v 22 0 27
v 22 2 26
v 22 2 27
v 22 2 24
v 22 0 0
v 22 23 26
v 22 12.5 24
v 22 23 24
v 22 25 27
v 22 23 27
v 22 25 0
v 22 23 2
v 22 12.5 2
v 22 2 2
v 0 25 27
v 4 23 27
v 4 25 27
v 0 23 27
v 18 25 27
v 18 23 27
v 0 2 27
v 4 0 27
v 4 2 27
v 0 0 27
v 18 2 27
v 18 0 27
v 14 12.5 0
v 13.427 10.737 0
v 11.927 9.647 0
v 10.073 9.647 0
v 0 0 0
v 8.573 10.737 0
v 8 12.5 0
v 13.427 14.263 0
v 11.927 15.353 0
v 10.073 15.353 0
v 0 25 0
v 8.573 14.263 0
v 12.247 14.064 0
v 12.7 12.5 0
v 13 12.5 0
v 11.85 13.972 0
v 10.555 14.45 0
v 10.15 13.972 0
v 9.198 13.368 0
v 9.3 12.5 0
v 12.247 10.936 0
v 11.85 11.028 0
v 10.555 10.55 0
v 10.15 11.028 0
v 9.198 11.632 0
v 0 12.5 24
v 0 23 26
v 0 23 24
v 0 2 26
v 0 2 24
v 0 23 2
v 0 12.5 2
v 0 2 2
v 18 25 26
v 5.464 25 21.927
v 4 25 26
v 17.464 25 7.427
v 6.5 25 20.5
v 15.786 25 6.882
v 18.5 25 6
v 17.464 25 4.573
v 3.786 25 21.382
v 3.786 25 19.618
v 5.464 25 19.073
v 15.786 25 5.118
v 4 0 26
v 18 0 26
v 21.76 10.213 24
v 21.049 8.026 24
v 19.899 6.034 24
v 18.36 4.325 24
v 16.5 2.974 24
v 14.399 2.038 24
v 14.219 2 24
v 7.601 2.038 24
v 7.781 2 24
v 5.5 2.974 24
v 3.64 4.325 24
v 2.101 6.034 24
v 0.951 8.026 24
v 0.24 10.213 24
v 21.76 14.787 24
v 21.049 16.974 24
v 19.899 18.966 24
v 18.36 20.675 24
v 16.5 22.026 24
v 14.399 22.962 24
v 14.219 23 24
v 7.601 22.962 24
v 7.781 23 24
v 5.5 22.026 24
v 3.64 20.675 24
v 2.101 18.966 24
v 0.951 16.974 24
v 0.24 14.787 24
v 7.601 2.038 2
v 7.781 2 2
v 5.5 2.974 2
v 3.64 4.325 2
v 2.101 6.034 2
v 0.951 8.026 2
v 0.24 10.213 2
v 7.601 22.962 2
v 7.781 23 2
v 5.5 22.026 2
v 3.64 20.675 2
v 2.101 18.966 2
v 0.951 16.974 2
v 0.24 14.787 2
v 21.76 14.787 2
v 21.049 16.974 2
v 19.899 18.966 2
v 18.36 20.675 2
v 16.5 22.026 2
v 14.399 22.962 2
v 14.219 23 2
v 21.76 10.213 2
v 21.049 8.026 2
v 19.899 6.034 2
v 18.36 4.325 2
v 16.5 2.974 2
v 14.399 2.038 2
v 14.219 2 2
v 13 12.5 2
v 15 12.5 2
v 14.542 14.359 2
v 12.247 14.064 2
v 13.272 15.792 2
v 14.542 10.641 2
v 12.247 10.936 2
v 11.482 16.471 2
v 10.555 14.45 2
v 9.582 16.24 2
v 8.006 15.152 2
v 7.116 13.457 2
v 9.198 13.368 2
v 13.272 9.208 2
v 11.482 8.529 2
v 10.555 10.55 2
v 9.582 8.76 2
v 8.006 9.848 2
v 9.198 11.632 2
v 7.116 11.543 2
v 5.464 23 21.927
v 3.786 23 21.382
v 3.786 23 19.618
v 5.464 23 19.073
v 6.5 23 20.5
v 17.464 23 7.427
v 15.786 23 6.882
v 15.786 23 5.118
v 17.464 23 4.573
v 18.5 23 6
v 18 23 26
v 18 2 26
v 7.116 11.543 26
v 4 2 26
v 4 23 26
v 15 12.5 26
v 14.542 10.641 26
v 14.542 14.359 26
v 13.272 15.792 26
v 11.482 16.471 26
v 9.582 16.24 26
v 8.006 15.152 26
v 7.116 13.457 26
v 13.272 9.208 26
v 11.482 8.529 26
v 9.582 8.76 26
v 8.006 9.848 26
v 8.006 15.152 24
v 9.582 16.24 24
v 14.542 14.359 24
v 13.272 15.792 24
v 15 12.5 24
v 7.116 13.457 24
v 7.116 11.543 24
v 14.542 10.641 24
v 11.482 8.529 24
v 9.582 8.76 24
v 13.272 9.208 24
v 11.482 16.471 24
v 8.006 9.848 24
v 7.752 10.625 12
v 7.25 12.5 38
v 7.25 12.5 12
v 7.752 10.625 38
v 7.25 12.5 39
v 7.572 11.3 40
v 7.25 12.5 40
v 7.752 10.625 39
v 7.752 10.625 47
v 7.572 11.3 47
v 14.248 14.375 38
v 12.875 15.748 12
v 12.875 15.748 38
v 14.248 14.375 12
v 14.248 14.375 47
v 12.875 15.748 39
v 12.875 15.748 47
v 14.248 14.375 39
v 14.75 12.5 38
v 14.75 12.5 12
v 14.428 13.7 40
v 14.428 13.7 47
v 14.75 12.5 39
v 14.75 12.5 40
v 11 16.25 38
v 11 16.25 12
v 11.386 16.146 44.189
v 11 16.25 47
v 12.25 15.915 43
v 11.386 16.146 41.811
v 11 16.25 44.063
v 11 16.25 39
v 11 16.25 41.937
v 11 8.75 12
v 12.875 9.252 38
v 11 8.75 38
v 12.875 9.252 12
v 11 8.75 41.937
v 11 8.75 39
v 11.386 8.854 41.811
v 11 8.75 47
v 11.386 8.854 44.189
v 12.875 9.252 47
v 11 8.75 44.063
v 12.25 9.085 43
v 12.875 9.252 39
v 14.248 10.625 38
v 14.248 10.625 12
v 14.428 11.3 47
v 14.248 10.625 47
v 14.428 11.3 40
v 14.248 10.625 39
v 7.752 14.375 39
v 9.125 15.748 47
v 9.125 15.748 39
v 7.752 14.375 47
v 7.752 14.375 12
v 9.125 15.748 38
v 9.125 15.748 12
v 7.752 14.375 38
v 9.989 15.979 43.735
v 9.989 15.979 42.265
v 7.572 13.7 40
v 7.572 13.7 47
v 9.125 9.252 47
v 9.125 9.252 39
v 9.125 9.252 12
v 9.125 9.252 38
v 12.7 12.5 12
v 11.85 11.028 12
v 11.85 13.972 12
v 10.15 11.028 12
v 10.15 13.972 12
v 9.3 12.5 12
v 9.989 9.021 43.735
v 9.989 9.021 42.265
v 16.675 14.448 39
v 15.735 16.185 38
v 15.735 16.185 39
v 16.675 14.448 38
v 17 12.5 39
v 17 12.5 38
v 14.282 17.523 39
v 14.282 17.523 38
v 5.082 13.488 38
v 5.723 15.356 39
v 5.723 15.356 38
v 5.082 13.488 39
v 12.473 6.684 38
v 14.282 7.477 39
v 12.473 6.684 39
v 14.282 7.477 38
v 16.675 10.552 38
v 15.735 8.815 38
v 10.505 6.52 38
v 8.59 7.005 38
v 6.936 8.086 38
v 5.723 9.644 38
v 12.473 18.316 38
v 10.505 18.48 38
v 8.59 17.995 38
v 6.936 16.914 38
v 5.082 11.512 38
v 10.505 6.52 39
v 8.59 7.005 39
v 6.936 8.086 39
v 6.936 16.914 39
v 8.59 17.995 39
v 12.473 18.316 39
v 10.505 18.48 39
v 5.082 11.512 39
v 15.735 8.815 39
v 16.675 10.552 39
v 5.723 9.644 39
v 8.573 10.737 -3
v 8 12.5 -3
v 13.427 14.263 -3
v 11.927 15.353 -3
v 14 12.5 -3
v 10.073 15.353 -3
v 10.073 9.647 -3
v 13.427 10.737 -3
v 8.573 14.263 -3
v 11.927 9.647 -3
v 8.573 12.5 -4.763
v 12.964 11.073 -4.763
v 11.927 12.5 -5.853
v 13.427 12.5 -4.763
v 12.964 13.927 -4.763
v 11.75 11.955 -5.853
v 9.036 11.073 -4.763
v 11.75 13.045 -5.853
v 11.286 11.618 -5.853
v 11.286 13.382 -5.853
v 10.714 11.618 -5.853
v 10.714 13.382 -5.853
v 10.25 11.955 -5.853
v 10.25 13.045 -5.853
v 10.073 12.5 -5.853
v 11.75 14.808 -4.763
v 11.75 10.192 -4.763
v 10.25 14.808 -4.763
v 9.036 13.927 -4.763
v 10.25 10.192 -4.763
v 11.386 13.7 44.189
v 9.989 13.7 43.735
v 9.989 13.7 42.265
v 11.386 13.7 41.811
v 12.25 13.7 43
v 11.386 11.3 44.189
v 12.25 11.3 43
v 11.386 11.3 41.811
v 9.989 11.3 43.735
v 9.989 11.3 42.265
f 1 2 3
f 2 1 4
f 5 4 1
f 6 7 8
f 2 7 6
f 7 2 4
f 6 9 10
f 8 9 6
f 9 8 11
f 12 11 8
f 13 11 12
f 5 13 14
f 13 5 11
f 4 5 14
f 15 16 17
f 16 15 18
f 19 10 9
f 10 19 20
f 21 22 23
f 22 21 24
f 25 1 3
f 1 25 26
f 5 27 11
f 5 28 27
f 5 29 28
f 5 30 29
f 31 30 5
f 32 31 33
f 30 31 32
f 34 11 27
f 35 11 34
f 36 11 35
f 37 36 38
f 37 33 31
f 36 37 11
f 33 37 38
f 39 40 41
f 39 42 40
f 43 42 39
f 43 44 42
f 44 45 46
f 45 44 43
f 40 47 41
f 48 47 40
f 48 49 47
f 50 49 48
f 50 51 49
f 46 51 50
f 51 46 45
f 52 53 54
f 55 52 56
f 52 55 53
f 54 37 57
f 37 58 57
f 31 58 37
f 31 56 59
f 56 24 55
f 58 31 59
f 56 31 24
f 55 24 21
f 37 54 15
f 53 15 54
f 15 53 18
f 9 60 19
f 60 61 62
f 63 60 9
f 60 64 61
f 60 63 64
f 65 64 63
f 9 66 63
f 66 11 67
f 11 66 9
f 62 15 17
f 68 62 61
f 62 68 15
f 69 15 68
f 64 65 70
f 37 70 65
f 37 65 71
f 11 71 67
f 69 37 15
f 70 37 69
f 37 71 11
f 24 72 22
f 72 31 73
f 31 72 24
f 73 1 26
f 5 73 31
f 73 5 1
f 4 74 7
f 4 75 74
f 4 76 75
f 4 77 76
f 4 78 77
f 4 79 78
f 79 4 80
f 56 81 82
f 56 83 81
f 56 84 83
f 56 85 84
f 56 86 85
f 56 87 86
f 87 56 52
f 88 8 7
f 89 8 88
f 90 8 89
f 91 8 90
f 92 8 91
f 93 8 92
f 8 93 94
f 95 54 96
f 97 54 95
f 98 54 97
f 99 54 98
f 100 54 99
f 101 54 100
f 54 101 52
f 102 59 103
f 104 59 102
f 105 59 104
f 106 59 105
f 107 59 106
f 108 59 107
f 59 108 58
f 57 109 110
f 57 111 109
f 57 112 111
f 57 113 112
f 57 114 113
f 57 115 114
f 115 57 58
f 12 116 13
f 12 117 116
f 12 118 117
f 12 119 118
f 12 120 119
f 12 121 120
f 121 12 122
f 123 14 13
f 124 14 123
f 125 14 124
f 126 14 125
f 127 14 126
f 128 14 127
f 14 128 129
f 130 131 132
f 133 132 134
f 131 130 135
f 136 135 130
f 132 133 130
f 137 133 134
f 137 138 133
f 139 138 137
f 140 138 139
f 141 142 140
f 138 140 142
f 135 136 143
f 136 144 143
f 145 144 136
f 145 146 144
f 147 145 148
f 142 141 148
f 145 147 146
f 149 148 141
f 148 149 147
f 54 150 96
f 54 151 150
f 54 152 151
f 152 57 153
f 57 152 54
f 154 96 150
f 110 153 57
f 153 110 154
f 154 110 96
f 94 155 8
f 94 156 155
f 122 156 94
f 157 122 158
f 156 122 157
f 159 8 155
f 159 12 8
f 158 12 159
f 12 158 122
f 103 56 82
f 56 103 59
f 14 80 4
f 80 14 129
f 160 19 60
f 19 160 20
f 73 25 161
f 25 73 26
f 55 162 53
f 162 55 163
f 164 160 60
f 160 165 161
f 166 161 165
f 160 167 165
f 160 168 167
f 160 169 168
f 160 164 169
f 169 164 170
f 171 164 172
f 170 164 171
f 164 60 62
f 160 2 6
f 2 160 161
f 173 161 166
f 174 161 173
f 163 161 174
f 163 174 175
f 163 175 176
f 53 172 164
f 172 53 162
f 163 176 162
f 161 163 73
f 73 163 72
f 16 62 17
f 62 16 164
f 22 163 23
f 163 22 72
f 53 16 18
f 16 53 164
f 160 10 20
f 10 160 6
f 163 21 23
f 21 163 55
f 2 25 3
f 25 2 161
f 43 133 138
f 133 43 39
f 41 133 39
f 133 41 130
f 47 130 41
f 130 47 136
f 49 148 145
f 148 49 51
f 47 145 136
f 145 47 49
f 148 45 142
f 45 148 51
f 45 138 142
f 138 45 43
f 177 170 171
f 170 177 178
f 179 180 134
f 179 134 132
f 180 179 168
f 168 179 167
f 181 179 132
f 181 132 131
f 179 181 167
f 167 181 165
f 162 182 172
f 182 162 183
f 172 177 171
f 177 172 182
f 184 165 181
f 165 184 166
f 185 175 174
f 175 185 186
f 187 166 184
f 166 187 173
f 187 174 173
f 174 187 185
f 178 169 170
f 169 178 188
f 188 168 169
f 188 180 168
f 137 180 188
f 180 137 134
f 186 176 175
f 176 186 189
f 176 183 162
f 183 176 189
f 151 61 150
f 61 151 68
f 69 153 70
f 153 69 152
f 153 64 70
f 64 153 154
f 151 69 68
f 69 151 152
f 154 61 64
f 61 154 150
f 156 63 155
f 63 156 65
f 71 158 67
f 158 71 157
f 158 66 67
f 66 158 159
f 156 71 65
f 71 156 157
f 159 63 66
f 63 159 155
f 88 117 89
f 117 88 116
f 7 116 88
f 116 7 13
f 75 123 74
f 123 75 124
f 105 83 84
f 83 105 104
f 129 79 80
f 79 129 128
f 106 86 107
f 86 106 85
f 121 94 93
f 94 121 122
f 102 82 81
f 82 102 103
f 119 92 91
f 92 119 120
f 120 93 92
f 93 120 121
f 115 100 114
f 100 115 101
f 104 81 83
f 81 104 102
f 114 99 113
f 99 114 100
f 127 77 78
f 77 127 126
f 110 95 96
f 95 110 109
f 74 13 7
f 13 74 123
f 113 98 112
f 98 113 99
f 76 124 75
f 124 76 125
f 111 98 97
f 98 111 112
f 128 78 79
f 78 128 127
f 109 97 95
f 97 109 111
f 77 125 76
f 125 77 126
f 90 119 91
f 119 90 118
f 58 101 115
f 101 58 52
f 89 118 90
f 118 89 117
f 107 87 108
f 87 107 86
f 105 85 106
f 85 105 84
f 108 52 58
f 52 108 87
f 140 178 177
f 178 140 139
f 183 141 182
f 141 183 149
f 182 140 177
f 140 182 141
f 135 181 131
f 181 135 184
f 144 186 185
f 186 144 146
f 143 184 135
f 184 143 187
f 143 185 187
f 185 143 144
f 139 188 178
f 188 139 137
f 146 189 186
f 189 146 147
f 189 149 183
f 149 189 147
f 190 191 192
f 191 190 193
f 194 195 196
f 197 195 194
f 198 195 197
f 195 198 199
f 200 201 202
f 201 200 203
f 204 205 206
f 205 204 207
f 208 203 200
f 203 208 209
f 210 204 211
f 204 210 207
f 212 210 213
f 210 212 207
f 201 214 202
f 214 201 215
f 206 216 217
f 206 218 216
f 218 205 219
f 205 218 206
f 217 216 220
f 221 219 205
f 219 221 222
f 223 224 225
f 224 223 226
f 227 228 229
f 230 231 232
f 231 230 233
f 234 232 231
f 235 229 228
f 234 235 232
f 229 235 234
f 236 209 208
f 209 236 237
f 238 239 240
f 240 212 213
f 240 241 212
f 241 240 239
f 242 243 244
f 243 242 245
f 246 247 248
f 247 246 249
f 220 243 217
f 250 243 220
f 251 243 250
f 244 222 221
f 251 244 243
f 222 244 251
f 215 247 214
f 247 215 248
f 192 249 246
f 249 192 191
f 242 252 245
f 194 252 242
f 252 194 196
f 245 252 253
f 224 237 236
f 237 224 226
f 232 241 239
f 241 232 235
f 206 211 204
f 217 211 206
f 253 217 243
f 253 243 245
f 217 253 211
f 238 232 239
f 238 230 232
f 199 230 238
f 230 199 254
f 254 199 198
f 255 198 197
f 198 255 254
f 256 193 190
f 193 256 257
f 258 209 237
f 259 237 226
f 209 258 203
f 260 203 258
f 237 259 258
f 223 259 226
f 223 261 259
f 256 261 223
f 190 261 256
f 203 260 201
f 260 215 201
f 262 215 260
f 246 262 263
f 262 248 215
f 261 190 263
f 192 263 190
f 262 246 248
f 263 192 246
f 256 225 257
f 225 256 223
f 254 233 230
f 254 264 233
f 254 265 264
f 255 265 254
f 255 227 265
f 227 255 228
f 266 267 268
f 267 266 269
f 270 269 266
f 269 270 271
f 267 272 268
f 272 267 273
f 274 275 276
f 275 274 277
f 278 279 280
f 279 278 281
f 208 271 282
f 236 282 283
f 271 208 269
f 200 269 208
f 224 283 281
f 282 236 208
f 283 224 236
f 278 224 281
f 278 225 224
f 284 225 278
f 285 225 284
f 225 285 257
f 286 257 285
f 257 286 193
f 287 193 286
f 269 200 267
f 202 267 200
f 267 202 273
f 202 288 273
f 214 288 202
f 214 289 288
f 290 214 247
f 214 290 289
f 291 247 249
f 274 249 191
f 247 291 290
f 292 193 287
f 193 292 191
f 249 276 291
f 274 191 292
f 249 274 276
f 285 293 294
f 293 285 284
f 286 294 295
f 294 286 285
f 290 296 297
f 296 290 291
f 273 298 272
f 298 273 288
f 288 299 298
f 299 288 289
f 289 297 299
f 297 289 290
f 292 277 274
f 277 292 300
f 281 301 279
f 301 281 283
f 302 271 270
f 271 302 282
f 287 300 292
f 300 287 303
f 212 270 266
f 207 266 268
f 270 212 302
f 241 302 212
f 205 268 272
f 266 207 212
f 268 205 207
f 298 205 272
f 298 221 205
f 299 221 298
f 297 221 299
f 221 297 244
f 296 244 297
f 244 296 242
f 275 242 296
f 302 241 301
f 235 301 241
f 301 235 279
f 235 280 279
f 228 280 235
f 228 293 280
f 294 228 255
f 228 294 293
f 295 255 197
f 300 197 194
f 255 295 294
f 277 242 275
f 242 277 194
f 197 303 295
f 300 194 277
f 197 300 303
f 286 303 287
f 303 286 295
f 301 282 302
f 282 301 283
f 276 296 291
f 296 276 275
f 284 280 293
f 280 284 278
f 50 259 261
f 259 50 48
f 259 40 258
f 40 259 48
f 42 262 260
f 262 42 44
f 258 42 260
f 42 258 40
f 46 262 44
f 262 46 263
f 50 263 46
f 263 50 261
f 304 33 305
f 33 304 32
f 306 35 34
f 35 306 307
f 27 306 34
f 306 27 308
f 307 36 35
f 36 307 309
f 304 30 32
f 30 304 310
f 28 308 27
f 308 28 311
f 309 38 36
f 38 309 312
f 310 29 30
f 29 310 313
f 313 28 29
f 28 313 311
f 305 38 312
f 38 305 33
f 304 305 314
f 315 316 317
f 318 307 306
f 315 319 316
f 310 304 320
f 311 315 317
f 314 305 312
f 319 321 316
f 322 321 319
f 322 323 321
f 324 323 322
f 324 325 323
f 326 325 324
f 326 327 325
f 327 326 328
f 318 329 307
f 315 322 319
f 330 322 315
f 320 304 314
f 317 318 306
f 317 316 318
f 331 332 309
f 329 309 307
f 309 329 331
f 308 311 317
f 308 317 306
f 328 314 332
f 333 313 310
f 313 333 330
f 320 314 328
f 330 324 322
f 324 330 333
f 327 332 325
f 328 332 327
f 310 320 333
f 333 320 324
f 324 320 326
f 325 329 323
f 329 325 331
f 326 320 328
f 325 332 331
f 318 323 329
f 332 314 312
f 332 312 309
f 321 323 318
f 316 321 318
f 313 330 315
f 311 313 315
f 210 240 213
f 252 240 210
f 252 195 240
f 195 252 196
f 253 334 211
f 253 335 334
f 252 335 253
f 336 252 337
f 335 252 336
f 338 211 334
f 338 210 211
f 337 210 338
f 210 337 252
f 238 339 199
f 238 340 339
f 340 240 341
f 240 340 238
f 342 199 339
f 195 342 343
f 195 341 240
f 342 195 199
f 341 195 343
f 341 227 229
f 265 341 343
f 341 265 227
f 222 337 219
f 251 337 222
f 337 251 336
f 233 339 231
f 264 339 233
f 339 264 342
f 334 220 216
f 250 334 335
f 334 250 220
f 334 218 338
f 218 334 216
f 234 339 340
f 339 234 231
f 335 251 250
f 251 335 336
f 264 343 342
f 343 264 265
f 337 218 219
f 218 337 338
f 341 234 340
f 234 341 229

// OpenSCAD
solenoid();

module solenoid(pos=false,type="JF0826B",_echo=false){
    position = pos ? 1 : 0;
    if(type=="JF0826B"){
        location = 12 - position * 10;
        color("silver") 
        difference(){
            cube([22,25,27]);
            translate([-1,2,2]) cube([24,21,22]);
            translate([4,-1,26]) cube([14,27,2]);
            translate([-1,2,26]) cube([24,21,2]);
            translate([11,12.5,-1]) cylinder(r=2,h=4);
            translate([11,12.5,3]) cylinder(r=4,h=27);
            translate([5,12.5,20.5]) 
                    rotate([-90,0,0]) cylinder(r=1.5,h=15);
            translate([17,12.5,6]) 
                    rotate([-90,0,0]) cylinder(r=1.5,h=15);
        }
        color("blue") translate([11,12.5,2]) difference(){
            cylinder(r=11,h=22);
            translate([0,0,-1]) cylinder(r=4,h=29);
        }
        color("silver") translate([11,12.5,location]) difference(){
        union(){
                cylinder(r=3.75,h=35);
                translate([0,0,26]) cylinder(r=6,h=1);
                translate([0,0,-15]) cylinder(r=1.7,h=16);
                translate([0,0,-15]) cylinder(r=3,h=3);
                translate([0,0,-15]) sphere(3);
            }
            translate([-5,-1.2,28]) cube([10,2.4,10]);
            translate([0,5,31]) rotate([90,0,0]) cylinder(r=1.25,h=10);
        }
        if(_echo){
            echo("position",position);
            echo("type",type);
            echo("throw (mm)",10);
            echo("width (Xmm)",22);
            echo("depth (Ymm)",25);
            echo("height (Zmm)",27);
            echo("HOA (Zmm, nut to top of shaft)",55);
            echo("mount holes (Dmm)",3);
            echo("mount apacing (XxZmm)",
                 "12x12 at...\n\t5 from vertical edge,\n\t6 from bottom edge.");
        }
    }
}
